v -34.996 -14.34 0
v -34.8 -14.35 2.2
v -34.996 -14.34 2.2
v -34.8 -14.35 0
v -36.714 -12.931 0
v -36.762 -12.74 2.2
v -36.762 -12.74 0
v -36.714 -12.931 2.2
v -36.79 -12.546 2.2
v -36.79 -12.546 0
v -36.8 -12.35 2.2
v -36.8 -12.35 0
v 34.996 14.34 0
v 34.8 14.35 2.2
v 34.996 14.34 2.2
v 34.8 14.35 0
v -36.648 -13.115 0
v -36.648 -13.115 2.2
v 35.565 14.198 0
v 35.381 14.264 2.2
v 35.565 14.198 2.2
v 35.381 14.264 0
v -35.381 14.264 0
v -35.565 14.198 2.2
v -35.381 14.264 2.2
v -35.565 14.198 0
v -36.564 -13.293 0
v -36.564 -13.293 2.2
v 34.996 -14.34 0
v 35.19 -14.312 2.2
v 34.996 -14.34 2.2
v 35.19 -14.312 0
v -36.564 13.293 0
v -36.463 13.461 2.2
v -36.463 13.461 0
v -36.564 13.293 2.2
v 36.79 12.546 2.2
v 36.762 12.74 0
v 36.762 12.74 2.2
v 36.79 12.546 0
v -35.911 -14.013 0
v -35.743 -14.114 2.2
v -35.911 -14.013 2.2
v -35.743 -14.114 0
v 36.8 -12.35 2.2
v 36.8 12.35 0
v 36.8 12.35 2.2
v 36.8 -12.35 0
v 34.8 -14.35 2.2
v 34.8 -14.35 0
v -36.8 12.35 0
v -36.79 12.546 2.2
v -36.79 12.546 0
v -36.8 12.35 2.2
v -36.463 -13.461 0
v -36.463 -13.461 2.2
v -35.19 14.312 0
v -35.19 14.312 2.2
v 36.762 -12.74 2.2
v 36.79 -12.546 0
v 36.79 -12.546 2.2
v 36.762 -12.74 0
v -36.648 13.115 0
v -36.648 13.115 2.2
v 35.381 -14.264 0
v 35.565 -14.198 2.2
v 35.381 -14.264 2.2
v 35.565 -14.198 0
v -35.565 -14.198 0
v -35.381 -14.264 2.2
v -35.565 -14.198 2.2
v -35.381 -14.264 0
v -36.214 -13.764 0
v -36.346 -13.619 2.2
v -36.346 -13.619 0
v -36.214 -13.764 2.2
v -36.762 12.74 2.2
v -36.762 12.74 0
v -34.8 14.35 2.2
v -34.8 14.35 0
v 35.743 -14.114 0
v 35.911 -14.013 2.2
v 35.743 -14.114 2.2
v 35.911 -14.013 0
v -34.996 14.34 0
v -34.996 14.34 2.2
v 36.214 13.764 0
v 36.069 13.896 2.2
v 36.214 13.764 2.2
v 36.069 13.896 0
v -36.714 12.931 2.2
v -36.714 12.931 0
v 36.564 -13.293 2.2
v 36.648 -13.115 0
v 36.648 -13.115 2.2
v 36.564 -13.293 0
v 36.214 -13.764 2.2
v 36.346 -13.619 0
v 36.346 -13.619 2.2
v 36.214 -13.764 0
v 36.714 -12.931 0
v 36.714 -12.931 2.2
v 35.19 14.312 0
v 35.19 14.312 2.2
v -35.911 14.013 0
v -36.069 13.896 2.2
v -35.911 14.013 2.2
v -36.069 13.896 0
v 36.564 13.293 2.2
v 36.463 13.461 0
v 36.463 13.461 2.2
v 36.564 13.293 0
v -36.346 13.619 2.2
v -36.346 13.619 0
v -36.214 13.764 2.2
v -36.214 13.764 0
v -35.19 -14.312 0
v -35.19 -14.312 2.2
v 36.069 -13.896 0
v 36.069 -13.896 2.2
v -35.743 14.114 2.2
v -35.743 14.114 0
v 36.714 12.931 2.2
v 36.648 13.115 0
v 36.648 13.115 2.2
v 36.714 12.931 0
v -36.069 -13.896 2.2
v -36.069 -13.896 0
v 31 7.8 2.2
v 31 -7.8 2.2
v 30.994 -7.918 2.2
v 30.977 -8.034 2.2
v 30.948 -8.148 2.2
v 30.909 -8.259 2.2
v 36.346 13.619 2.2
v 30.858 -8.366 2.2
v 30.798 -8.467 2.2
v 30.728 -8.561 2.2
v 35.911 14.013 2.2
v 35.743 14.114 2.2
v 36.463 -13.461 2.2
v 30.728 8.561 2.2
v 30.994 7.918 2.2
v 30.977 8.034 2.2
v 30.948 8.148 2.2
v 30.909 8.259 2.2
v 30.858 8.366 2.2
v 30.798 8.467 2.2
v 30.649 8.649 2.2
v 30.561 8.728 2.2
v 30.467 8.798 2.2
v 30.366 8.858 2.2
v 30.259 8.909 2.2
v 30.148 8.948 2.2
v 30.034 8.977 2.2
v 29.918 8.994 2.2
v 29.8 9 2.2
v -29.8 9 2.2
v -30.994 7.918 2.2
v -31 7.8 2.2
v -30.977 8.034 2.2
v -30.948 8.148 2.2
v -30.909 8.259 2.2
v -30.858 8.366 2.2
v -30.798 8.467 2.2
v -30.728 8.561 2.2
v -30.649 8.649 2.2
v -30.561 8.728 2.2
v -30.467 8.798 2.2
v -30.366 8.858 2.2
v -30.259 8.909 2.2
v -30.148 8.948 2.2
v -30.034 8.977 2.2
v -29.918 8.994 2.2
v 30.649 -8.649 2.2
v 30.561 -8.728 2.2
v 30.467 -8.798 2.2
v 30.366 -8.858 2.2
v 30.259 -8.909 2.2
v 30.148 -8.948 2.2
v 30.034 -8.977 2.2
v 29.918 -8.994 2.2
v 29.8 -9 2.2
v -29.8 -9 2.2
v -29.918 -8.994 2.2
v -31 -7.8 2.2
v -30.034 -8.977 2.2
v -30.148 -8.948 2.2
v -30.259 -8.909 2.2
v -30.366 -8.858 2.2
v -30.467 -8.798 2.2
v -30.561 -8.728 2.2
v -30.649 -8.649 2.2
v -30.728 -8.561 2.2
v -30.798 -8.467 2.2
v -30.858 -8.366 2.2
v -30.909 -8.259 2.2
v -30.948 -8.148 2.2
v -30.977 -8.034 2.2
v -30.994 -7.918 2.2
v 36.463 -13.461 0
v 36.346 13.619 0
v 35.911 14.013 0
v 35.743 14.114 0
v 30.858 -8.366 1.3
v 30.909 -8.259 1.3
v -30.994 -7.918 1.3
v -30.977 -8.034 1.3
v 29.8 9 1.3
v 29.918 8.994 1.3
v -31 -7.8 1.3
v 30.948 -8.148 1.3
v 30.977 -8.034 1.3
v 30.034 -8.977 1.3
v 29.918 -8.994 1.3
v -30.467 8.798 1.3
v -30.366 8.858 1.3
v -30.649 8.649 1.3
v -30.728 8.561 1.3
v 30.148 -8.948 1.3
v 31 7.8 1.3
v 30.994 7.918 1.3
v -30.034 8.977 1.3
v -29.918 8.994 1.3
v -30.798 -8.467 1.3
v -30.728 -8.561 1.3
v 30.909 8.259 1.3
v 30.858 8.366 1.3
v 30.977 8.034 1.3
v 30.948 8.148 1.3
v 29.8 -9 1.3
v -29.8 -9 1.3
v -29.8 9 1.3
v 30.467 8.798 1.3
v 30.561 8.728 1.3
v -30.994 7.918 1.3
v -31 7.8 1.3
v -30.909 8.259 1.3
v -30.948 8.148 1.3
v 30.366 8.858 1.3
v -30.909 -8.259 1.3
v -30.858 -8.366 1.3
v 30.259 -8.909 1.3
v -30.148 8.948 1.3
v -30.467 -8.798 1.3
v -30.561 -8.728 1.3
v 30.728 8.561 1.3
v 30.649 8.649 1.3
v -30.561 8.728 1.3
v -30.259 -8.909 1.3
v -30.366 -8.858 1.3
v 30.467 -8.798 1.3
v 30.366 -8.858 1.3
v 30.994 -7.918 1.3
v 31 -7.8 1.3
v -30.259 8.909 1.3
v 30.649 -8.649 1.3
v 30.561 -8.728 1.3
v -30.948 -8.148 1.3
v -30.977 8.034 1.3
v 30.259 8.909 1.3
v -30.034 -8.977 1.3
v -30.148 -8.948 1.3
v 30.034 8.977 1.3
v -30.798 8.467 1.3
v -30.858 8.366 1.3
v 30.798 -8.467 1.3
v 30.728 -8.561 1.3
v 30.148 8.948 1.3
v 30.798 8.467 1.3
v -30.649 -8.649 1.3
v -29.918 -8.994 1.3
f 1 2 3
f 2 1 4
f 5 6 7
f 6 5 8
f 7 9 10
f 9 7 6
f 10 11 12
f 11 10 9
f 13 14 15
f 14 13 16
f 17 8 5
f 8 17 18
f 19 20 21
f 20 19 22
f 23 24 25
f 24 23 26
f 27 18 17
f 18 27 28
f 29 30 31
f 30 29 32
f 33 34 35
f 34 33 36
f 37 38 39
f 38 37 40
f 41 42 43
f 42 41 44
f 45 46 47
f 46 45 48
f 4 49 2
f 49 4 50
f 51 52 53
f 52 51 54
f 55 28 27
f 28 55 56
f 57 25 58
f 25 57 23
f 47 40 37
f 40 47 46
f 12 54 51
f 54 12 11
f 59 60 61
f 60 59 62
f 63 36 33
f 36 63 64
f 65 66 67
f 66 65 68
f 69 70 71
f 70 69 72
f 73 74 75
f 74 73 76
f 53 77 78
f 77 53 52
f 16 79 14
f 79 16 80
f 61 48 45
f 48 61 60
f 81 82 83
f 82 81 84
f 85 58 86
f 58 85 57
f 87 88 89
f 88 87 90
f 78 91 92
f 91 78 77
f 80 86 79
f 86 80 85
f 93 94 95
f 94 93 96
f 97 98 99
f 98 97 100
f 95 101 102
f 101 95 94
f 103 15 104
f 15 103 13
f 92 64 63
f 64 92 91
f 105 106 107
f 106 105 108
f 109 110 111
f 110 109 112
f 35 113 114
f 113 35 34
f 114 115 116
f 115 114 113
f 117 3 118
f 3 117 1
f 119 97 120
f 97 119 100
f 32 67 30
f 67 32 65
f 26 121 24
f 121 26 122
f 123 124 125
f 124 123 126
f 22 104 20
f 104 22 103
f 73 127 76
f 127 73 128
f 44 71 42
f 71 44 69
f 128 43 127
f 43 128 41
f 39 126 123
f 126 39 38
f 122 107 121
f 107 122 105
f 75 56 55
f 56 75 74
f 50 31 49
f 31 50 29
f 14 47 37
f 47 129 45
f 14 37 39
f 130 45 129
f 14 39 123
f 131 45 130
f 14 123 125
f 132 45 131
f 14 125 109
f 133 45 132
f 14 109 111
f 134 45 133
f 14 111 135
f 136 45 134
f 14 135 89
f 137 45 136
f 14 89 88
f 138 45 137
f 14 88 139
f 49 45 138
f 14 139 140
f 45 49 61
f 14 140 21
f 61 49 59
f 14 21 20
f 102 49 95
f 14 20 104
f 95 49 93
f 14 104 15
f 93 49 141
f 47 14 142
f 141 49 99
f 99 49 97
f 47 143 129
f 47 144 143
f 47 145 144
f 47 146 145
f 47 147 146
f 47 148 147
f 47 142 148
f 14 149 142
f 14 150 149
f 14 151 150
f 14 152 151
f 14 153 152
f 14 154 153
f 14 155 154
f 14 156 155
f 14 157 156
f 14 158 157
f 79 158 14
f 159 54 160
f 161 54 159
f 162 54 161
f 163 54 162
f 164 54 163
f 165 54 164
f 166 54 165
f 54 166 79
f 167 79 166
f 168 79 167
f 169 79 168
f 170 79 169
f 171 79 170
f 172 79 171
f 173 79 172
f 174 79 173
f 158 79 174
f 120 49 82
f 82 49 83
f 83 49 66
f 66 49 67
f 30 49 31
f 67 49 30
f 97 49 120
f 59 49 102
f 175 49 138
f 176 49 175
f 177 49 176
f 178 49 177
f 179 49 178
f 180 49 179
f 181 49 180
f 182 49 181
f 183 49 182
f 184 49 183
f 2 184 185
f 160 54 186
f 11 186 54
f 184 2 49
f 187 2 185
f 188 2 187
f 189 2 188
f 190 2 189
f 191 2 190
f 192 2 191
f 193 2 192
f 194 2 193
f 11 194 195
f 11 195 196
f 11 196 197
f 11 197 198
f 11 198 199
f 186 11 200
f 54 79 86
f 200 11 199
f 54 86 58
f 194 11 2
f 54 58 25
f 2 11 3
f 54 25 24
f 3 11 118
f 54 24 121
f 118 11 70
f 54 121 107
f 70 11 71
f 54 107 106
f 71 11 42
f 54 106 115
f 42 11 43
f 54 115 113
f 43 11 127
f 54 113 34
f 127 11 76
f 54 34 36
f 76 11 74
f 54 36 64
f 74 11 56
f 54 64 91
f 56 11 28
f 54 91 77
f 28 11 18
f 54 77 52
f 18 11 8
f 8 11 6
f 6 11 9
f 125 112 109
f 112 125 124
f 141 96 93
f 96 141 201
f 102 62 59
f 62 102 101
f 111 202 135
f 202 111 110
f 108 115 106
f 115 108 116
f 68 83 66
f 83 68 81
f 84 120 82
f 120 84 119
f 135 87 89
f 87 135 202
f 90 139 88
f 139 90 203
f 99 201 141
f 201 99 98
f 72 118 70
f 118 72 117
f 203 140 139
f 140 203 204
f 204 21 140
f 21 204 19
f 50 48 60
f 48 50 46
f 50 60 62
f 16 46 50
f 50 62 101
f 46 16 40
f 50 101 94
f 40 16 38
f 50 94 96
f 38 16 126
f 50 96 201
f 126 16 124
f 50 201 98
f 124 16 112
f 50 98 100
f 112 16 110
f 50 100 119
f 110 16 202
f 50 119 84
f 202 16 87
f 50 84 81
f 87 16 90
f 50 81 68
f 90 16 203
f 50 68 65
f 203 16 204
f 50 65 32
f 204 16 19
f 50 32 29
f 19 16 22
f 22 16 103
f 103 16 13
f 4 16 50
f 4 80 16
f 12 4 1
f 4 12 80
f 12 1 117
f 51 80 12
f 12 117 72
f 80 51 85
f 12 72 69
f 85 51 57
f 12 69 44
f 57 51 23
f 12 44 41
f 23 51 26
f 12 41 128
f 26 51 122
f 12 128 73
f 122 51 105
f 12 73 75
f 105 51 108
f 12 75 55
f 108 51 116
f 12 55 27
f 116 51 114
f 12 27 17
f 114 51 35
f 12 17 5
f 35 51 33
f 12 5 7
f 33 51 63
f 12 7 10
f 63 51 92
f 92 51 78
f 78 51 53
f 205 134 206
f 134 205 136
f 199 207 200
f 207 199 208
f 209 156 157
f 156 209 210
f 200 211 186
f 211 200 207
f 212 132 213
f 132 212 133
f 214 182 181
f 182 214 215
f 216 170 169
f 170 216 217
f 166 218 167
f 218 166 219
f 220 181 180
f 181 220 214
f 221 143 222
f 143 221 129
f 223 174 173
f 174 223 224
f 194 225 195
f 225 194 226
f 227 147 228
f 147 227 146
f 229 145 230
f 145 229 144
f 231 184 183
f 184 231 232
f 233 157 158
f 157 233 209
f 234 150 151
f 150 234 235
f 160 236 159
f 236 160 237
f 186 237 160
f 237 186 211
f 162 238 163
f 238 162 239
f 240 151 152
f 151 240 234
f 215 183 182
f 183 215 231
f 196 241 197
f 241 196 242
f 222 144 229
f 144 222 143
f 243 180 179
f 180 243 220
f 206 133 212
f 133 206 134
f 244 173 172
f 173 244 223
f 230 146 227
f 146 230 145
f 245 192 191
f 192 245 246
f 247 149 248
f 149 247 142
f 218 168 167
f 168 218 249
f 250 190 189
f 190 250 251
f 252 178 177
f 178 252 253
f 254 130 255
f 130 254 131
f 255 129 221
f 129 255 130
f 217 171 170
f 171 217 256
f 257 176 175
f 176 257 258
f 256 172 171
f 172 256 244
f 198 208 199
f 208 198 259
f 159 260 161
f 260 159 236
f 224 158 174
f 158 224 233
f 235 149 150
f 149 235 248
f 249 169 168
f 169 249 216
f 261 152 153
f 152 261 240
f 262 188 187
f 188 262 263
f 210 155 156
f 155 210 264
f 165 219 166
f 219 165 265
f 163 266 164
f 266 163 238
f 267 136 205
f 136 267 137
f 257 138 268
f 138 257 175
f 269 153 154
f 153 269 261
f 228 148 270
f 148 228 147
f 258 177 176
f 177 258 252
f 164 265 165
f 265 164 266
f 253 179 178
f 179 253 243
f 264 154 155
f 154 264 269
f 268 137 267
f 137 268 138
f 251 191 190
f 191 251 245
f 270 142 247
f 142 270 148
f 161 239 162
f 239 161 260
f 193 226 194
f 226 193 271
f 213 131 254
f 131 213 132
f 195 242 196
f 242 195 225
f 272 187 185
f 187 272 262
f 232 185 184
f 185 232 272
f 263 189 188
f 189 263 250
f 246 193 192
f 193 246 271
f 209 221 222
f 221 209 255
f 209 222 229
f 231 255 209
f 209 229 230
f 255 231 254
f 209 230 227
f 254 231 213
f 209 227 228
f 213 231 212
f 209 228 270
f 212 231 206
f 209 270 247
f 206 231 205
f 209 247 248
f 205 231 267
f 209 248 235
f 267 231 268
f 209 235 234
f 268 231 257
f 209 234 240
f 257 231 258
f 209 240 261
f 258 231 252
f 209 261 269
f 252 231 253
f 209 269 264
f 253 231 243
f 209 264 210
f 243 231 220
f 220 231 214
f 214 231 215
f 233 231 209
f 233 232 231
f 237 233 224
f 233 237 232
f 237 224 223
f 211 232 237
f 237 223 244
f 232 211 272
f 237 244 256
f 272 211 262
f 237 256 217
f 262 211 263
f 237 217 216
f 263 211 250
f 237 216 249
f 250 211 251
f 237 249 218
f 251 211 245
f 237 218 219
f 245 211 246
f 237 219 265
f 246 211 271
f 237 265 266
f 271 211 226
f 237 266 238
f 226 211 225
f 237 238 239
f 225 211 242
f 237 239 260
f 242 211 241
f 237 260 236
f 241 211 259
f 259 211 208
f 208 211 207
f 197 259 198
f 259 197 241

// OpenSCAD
$fn=64;

module rounded_rect_2d(w, h, r){
    r2 = min(r, min(w,h)/2);
    hull(){
        translate([ w/2 - r2,  h/2 - r2]) circle(r=r2);
        translate([-w/2 + r2,  h/2 - r2]) circle(r=r2);
        translate([-w/2 + r2, -h/2 + r2]) circle(r=r2);
        translate([ w/2 - r2, -h/2 + r2]) circle(r=r2);
    }
}

module lcd_s_7282b(body_w=73.6, body_h=28.7, body_t=2.2, corner_r=2.0,
                  bezel_inset=1.2, bezel_t=0.6,
                  window_w=62.0, window_h=18.0, window_depth=0.9){
    difference(){
        union(){
            linear_extrude(height=body_t)
                rounded_rect_2d(body_w, body_h, corner_r);

            translate([0,0,body_t - bezel_t])
                linear_extrude(height=bezel_t)
                    rounded_rect_2d(body_w - 2*bezel_inset, body_h - 2*bezel_inset, max(0.5, corner_r-0.8));
        }

        translate([0,0,body_t - window_depth])
            linear_extrude(height=window_depth + 0.2)
                rounded_rect_2d(window_w, window_h, 1.2);
    }
}

lcd_s_7282b();
